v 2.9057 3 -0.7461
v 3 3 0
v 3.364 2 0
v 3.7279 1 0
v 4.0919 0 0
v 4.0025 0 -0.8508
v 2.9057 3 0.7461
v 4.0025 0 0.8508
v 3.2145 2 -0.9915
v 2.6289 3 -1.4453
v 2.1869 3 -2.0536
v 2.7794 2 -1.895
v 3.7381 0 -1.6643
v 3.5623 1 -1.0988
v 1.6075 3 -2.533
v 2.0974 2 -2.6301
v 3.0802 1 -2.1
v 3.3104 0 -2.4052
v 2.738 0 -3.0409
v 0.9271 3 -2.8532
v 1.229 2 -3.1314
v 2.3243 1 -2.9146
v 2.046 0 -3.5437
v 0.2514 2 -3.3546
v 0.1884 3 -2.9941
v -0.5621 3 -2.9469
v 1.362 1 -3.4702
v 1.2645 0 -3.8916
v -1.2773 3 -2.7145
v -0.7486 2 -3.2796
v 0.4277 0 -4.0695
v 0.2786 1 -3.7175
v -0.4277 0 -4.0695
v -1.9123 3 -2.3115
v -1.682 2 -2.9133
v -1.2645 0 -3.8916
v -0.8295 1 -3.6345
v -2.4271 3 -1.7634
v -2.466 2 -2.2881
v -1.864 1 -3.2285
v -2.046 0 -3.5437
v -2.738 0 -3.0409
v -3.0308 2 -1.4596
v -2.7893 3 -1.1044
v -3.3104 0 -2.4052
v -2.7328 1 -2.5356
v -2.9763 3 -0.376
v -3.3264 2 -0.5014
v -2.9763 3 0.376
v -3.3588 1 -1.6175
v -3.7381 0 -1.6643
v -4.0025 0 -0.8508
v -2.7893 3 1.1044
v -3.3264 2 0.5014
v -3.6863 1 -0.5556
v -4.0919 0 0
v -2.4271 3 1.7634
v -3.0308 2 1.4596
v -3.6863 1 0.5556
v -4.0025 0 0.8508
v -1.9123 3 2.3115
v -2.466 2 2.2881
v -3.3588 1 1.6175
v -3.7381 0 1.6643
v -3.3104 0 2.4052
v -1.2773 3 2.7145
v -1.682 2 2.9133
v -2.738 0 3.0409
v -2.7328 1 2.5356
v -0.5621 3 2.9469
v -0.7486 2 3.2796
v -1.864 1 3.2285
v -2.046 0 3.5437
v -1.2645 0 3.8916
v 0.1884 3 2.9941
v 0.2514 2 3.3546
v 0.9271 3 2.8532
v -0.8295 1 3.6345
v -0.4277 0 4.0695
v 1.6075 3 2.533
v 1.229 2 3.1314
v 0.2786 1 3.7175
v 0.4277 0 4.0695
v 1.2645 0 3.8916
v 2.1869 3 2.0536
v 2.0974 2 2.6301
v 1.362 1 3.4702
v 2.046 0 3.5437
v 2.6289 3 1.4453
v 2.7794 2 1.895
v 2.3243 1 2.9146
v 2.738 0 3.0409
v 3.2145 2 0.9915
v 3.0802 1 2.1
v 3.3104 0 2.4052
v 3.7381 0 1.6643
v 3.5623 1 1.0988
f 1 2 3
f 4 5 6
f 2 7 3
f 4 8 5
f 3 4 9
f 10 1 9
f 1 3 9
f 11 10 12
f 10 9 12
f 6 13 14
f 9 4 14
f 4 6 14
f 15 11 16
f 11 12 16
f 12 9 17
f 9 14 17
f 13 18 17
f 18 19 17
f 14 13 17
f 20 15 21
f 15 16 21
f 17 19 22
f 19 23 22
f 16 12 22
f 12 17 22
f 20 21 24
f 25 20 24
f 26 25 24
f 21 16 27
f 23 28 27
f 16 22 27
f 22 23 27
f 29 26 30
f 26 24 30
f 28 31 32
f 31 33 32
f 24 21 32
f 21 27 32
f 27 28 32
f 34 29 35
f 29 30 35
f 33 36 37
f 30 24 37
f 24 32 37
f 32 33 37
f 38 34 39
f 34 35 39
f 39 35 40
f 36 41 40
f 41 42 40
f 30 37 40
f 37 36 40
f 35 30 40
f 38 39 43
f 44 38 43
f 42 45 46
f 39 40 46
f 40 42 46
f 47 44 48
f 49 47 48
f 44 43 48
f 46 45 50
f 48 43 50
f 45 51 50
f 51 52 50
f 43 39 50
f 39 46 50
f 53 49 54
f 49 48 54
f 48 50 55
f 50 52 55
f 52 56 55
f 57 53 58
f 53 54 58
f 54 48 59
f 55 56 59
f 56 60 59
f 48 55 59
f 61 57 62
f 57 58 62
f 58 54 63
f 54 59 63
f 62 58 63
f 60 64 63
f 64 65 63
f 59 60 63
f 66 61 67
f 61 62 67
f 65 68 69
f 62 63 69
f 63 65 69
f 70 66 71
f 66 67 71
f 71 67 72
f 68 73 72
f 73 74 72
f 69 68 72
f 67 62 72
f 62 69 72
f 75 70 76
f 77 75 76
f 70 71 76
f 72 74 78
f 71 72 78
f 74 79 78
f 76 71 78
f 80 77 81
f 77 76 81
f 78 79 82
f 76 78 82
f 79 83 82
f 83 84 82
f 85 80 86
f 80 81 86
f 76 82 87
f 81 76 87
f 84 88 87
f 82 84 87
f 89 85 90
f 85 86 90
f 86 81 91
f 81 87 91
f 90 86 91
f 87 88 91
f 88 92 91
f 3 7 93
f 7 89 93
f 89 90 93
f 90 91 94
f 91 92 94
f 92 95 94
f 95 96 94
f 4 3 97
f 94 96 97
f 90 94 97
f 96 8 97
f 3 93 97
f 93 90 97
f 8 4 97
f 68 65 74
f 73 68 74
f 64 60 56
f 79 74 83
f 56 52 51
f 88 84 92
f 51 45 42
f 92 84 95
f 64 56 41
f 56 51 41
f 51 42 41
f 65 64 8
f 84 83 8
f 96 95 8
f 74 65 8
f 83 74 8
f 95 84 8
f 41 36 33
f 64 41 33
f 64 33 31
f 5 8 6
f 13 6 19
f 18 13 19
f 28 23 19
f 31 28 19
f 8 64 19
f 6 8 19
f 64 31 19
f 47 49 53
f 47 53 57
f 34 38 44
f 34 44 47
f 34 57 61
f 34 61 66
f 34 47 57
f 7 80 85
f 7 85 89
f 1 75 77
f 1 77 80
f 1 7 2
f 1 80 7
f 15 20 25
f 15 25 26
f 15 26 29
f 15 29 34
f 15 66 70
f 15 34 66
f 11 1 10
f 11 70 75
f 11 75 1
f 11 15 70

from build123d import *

# Parameters (mm, degrees)
SKETCH1_R           = 3
BOSS_EXTRUDE1_DEPTH = 3
DRAFT2_ANGLE        = 1
DRAFT3_ANGLE        = 20


with BuildPart() as part:
    # Sketch1 → Boss-Extrude1 (new body)
    with BuildSketch(Plane(origin=(0, 0, 0), x_dir=(1, 0, 0), z_dir=(0, 1, 0))):
        Circle(SKETCH1_R)
    extrude(amount=BOSS_EXTRUDE1_DEPTH)

    # Draft2
    draft2_faces = [part.faces().sort_by_distance(p)[0] for p in [
        (-3, 1.5, 0),
    ]]
    draft(draft2_faces, Plane.ZX.offset(3), DRAFT2_ANGLE)

    # Draft3
    draft3_faces = [part.faces().sort_by_distance(p)[0] for p in [
        (-3.026182597, 1.5, 0),
    ]]
    draft(draft3_faces, Plane.ZX.offset(3), DRAFT3_ANGLE)


solid = part.part
